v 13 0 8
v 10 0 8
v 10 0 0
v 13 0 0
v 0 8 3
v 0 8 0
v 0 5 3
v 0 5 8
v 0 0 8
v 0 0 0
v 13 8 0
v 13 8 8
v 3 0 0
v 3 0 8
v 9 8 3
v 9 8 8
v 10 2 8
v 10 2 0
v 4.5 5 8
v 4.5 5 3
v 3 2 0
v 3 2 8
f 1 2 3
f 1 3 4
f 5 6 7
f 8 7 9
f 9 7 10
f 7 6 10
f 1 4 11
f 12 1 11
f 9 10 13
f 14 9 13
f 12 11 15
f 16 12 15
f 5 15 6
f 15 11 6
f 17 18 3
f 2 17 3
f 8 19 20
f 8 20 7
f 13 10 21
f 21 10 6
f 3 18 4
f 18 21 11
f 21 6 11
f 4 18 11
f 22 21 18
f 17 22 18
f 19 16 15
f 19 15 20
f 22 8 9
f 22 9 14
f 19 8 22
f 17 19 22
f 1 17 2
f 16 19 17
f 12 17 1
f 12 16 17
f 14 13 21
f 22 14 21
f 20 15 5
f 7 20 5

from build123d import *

# Parameters (mm, degrees)
BOSS_EXTRUDE1_DEPTH = 8
CUT_EXTRUDE1_DEPTH  = 5


with BuildPart() as part:
    # Sketch1 → Boss-Extrude1 (new body)
    with BuildSketch(Plane.XY):
        Polygon((0, 8), (0, 0), (3, 0), (3, 2), (10, 2), (10, 0), (13, 0), (13, 8), align=None)
    extrude(amount=BOSS_EXTRUDE1_DEPTH)

    # Sketch2 → Cut-Extrude1 (cut)
    with BuildSketch(Plane.XY.offset(8)):
        Polygon((9, 8), (4.5, 5), (0, 5), (0, 8), align=None)
    extrude(amount=-CUT_EXTRUDE1_DEPTH, mode=Mode.SUBTRACT)


solid = part.part
